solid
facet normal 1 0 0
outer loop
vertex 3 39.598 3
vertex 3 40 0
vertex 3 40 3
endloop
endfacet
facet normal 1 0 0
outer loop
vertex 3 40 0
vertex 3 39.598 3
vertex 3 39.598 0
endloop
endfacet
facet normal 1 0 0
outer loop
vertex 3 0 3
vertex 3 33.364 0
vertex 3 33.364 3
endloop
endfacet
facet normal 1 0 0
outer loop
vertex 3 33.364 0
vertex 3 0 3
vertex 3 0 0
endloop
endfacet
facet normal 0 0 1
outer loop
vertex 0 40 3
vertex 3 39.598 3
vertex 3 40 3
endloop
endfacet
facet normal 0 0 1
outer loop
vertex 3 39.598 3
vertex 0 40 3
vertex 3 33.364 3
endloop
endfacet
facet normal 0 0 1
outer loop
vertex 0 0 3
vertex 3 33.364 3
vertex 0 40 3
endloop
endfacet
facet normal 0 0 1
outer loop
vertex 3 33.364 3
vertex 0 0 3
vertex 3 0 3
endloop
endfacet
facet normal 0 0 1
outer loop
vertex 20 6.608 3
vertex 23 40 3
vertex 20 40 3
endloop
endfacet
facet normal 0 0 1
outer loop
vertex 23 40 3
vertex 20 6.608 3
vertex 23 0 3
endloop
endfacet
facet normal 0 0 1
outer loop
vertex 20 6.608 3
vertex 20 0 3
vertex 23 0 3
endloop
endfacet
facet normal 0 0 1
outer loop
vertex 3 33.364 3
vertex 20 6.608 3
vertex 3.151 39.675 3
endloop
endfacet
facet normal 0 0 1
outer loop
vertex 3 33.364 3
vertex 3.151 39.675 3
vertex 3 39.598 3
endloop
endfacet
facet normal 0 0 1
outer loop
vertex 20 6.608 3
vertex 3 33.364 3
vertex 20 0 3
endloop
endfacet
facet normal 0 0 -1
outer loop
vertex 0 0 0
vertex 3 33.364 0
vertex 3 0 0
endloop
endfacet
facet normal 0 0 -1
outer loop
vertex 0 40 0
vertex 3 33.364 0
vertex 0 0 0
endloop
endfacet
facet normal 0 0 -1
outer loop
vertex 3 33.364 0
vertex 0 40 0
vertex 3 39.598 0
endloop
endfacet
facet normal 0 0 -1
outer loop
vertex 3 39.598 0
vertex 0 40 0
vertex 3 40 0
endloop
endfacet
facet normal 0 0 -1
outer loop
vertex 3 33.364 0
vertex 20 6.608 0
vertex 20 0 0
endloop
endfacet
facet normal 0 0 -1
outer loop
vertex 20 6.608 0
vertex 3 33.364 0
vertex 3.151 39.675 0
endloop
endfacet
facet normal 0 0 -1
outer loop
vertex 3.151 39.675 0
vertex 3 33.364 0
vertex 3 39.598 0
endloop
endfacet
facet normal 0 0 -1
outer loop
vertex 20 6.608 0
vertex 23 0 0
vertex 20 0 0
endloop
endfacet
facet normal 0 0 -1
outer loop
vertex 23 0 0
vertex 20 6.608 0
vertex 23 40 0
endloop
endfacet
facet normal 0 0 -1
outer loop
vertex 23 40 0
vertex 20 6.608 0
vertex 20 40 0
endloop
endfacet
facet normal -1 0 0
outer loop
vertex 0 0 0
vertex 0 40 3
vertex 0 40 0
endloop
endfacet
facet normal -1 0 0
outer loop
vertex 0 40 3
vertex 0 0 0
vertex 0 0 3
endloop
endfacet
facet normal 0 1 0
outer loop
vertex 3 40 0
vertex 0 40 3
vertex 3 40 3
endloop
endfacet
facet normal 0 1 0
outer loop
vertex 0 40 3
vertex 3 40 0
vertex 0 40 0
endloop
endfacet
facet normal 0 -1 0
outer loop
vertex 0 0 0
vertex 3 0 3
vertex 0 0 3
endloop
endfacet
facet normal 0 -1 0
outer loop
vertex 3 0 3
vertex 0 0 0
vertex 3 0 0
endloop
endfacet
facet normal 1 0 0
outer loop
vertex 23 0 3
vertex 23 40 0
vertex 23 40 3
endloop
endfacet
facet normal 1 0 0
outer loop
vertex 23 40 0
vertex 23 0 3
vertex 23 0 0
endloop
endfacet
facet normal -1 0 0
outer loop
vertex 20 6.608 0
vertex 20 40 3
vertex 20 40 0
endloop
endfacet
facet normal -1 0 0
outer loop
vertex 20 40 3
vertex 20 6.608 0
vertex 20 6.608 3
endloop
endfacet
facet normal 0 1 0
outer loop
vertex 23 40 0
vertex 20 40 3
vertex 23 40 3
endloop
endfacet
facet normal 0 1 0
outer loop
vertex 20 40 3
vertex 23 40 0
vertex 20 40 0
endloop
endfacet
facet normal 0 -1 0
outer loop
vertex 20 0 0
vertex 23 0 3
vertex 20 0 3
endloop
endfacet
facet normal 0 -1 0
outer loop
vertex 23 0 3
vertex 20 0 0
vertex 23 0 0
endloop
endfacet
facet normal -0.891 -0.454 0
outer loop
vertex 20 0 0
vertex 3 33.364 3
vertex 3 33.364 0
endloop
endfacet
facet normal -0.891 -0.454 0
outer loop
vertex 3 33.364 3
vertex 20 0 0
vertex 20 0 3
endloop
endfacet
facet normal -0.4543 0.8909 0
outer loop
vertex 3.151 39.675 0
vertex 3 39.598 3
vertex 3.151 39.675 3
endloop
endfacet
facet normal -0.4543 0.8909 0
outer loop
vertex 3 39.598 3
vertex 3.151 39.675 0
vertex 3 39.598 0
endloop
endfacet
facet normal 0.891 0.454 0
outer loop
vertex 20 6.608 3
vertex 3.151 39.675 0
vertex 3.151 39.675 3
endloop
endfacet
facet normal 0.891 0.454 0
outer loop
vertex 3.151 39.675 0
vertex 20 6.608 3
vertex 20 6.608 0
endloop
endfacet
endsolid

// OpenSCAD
//N
union(){
 cube([3,40,3]);
 translate([20,0,0,]) cube([3,40,3]);
 translate([20,0,0]) rotate([0,0,27]) cube([3,43,3]);
}
